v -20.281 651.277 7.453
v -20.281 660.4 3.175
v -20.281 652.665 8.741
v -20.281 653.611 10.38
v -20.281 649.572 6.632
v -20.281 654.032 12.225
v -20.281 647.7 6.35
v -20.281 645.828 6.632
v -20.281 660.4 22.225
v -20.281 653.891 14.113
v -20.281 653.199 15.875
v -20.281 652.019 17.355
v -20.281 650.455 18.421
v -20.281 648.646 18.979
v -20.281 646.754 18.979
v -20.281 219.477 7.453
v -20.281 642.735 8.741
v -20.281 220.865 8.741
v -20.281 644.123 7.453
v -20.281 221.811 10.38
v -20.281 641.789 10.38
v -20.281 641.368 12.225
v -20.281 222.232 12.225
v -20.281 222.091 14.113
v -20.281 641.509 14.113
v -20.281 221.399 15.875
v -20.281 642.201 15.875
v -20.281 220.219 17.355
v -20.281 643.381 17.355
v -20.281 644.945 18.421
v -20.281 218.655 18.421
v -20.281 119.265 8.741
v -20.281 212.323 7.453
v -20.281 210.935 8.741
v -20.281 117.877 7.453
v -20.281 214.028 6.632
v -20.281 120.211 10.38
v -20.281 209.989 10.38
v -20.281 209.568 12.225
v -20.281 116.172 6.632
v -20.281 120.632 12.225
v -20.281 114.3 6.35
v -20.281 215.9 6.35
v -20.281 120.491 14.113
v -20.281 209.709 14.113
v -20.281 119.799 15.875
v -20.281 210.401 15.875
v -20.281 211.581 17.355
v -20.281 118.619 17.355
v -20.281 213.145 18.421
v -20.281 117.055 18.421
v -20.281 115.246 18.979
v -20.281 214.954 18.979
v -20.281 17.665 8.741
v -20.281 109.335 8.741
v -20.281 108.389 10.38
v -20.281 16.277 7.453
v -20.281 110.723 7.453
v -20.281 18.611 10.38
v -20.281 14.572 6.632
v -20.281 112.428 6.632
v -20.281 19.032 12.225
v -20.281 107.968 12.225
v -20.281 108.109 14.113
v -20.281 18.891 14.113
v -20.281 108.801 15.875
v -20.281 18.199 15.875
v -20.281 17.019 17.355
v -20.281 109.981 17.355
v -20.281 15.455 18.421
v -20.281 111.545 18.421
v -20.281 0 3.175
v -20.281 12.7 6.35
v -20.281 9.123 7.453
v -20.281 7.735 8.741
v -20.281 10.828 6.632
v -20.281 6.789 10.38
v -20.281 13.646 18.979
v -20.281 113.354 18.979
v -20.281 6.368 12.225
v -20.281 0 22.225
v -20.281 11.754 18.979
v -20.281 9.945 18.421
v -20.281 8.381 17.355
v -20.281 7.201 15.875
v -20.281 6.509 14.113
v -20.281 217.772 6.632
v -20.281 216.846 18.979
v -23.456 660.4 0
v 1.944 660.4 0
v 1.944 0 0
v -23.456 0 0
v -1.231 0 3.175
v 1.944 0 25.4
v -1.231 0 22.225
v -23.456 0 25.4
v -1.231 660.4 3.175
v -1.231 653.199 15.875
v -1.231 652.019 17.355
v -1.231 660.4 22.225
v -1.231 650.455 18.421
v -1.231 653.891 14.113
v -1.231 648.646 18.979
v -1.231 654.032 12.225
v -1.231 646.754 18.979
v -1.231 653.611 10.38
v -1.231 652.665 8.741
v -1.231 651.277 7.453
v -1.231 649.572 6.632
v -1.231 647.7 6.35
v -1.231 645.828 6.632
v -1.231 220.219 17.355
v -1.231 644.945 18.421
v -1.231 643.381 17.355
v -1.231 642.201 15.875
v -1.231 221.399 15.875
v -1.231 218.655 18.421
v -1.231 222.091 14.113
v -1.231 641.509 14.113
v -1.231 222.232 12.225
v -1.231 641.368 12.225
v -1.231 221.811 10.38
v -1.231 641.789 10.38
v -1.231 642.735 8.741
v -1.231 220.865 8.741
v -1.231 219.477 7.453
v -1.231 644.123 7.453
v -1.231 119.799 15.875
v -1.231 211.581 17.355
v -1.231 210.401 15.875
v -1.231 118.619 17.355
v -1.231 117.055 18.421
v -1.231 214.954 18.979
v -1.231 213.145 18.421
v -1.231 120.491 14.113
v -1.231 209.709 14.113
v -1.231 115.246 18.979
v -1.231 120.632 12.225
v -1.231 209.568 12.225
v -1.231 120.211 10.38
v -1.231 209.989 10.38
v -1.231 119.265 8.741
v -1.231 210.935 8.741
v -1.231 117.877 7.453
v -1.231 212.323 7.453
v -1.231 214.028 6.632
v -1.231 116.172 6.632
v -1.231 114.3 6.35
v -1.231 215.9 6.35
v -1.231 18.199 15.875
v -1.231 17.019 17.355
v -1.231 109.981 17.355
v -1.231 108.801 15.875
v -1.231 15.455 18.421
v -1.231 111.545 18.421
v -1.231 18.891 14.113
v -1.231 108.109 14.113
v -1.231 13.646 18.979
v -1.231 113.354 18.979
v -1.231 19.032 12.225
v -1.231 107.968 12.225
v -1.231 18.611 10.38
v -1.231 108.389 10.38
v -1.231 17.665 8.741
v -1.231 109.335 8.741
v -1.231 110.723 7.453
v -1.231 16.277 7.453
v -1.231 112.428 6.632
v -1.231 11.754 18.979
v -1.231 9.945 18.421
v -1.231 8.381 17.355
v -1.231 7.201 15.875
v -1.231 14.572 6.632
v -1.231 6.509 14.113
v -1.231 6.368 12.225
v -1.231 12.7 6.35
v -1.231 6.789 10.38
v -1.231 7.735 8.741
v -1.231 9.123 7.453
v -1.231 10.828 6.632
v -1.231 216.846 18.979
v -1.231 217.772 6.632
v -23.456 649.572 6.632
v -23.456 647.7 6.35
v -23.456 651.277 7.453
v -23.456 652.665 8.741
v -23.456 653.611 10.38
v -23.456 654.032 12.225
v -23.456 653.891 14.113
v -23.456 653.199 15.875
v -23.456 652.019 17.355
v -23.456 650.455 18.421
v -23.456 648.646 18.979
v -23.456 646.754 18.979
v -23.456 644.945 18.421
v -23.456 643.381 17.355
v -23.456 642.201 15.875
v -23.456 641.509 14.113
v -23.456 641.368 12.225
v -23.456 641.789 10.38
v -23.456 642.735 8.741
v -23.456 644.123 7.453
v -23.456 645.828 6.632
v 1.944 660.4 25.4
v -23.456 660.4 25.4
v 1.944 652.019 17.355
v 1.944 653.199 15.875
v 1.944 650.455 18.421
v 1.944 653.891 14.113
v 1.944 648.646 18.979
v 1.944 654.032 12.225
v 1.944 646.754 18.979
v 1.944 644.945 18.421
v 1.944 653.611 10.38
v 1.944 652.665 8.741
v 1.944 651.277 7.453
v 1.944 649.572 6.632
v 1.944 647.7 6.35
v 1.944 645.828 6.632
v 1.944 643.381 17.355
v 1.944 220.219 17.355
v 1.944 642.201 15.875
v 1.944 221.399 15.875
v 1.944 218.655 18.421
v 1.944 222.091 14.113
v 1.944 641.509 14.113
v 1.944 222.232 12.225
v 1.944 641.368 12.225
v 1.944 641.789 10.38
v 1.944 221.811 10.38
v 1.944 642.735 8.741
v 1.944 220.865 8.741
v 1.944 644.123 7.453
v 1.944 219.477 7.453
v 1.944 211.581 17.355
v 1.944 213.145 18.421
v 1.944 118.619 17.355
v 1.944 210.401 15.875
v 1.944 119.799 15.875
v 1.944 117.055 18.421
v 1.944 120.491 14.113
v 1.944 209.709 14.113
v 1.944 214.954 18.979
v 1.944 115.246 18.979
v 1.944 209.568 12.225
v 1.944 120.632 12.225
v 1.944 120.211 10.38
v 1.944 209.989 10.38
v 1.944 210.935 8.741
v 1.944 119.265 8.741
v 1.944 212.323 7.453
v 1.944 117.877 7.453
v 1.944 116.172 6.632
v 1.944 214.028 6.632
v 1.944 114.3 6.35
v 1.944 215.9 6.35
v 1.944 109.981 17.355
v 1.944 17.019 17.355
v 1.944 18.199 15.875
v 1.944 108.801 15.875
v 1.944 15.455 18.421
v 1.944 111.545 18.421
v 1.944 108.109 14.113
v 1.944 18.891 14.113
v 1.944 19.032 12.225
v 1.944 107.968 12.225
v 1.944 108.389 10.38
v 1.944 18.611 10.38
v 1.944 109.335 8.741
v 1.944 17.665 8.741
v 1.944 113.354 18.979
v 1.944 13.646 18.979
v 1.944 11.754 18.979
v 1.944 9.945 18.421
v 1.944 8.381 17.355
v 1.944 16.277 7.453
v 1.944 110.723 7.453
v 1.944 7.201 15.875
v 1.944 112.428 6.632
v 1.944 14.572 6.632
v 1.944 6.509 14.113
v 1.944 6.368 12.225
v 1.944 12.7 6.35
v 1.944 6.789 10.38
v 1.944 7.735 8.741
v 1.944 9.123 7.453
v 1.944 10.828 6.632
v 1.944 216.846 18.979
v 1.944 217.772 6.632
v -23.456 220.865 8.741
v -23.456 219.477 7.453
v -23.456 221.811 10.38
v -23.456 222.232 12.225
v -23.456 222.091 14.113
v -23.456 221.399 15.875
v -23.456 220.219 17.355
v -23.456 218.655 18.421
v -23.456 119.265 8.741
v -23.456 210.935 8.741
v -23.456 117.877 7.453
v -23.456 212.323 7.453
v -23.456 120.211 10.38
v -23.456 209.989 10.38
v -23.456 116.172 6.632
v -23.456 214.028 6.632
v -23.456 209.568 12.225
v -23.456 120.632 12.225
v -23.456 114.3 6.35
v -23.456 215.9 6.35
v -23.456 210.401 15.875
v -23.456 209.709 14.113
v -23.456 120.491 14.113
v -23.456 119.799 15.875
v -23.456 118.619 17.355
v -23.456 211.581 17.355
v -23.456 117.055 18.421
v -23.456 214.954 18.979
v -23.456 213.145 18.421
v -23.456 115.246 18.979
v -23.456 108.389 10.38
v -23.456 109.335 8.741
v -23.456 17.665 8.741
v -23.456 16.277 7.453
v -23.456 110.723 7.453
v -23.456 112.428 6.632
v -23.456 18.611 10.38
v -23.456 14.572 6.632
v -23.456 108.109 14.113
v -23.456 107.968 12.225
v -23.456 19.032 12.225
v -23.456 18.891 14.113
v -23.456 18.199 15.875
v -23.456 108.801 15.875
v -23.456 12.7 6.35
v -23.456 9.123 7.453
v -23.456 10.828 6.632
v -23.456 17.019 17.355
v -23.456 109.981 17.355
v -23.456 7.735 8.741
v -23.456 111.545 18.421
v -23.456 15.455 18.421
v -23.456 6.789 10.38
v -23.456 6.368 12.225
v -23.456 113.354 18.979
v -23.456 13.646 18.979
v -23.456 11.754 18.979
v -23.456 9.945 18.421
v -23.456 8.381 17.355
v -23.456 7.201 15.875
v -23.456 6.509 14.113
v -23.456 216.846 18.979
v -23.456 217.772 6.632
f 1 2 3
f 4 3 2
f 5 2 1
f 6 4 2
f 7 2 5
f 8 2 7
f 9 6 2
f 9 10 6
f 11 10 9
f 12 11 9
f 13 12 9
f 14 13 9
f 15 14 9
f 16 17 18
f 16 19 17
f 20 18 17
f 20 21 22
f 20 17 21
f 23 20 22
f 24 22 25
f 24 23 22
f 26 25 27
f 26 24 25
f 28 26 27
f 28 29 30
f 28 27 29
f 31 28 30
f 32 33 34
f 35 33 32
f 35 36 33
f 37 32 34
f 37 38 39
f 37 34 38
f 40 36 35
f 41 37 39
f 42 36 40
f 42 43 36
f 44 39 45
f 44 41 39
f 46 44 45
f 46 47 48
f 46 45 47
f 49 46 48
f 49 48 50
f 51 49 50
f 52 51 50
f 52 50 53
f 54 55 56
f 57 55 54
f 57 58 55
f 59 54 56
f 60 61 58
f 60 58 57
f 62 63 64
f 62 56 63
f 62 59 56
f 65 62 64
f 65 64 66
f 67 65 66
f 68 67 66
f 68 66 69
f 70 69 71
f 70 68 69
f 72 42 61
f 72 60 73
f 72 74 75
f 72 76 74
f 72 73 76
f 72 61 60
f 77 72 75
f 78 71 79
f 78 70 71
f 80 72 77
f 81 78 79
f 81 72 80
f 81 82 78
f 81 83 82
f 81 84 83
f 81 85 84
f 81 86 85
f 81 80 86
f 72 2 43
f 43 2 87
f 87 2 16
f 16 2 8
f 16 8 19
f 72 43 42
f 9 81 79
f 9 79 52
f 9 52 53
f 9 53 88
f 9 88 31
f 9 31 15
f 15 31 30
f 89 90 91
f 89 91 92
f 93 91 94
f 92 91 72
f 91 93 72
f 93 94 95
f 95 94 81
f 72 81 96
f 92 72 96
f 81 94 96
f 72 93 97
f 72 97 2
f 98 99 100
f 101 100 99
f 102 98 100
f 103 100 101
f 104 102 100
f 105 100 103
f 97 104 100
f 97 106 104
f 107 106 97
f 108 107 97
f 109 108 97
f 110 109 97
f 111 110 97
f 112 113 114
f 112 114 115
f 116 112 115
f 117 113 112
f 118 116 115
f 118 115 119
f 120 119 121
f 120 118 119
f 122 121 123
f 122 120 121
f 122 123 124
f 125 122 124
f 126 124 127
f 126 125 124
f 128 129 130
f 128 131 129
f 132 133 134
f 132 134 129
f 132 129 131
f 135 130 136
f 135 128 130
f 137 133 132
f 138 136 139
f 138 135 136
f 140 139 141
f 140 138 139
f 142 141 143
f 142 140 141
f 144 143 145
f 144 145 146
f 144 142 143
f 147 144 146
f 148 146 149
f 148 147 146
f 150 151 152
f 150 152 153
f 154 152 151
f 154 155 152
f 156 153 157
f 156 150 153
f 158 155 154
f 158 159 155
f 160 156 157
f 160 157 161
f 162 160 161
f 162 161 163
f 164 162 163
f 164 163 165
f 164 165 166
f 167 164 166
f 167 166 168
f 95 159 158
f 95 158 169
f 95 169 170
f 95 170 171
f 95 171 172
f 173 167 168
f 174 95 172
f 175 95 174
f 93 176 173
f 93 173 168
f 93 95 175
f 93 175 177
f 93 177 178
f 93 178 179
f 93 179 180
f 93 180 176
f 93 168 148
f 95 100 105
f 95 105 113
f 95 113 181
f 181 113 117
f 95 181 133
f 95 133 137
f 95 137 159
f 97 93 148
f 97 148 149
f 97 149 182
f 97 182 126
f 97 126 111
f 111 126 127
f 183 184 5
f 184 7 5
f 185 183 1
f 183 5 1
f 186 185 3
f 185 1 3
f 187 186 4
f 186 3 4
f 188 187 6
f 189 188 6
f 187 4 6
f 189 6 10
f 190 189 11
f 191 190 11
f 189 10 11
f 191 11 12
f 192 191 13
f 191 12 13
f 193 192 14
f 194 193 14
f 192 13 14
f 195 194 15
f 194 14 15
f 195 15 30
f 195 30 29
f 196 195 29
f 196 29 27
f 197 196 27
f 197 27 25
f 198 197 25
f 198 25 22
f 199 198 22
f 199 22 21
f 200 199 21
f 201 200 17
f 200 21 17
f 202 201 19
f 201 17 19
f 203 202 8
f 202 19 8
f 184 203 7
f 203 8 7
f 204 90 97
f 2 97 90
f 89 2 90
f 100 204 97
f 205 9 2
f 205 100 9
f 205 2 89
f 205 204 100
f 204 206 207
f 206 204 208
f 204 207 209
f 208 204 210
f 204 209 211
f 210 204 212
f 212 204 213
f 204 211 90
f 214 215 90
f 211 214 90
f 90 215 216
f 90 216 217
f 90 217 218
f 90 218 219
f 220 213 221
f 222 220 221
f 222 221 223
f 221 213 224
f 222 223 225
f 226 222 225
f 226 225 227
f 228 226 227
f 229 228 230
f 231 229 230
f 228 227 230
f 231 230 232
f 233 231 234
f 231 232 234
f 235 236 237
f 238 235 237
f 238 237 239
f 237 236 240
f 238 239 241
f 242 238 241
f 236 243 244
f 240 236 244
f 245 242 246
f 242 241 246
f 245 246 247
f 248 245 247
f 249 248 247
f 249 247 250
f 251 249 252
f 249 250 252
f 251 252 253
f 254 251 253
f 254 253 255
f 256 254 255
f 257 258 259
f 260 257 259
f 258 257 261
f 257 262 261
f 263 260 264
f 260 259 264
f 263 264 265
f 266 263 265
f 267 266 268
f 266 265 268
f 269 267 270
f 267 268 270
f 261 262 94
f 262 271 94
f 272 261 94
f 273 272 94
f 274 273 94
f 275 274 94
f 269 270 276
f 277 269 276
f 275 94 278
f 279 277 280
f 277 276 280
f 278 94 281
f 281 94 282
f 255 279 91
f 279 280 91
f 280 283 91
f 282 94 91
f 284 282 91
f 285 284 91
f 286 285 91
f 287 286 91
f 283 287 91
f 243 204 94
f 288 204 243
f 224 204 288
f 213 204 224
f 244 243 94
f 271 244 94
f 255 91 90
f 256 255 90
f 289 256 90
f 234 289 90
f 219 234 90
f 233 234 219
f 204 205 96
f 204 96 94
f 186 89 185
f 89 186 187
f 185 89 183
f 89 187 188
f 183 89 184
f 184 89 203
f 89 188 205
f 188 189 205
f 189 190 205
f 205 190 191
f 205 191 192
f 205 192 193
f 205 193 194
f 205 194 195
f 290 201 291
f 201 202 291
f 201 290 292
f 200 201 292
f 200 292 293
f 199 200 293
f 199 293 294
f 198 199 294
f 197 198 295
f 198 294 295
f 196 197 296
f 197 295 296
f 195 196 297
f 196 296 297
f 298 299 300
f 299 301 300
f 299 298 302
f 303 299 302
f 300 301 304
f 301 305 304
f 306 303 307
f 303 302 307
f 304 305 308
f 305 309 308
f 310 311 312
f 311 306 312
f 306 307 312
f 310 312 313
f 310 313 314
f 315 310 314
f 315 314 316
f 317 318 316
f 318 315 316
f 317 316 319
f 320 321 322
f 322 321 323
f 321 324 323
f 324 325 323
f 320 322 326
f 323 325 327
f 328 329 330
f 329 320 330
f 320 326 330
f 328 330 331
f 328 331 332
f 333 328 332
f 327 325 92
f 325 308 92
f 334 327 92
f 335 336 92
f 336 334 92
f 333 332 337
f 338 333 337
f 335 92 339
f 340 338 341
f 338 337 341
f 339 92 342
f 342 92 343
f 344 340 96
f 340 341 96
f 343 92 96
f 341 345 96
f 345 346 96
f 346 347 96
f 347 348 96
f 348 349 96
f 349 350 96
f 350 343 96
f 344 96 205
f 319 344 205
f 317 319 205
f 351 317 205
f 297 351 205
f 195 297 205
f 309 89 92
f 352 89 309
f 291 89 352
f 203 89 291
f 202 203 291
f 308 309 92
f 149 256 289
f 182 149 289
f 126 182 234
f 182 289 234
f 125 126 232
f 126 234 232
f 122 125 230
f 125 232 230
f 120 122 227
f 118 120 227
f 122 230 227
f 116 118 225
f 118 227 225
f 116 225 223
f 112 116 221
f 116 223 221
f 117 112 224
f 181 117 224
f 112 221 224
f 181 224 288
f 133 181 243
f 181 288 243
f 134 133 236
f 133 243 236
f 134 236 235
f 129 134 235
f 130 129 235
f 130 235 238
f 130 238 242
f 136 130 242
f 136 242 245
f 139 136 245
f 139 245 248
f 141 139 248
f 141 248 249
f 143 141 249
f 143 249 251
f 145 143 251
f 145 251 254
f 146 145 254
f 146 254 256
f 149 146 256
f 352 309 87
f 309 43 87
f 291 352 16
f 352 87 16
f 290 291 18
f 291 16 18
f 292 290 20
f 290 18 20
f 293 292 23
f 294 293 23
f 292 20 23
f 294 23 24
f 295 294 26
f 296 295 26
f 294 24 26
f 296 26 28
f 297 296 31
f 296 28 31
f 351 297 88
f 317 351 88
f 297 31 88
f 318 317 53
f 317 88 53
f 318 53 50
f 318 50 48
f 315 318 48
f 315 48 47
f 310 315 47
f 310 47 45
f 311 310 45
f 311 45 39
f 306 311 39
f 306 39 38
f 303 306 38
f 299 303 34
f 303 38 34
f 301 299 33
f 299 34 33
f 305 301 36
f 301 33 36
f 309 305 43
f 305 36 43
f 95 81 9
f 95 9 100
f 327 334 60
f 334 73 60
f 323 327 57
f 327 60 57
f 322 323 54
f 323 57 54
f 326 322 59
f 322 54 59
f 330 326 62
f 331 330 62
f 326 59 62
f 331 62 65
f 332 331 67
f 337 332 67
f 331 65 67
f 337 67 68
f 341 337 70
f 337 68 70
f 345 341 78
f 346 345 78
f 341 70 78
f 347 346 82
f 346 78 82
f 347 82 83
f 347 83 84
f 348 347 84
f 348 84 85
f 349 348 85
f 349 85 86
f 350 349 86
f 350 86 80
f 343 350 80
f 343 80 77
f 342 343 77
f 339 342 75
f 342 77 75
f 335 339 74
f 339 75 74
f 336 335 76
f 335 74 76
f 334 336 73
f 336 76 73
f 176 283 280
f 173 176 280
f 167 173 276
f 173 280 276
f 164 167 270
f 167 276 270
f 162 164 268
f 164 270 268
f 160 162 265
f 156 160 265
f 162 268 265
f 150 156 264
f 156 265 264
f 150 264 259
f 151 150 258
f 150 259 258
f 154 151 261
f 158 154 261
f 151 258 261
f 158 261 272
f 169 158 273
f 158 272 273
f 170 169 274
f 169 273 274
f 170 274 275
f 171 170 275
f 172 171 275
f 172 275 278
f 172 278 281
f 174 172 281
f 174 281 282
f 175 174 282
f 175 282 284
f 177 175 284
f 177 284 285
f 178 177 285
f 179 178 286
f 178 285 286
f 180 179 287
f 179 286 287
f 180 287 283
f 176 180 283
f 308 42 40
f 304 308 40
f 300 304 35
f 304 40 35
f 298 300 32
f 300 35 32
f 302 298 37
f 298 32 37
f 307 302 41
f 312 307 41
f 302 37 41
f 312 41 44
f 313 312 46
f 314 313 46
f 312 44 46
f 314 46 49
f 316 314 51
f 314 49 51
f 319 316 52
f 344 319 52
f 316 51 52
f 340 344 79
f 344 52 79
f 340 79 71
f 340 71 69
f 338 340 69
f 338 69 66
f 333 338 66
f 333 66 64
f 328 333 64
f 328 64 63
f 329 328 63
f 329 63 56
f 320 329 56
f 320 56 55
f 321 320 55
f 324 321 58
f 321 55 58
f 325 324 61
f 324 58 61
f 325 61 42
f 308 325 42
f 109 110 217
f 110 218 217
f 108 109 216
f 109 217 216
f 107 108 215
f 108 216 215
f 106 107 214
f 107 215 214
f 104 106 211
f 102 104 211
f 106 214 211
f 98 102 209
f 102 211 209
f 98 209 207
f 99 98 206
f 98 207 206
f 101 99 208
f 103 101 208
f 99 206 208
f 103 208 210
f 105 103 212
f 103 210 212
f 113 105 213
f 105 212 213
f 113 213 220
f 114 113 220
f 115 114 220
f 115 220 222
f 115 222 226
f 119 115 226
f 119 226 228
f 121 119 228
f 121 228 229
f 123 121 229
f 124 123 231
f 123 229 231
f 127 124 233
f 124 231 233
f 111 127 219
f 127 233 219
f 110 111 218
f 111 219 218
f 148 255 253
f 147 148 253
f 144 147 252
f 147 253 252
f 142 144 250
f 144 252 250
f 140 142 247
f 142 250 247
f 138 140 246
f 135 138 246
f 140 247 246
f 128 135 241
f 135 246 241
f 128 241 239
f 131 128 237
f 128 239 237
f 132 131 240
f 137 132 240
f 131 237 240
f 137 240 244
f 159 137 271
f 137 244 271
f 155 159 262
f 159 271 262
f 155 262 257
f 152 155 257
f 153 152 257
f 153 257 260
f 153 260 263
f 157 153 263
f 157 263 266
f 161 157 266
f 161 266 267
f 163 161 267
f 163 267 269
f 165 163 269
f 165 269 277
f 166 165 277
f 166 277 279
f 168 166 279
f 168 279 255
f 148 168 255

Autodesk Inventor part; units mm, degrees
ref_plane "YZ Plane" through (0, 0, 0) normal (1, 0, 0) x (0, 1, 0)
ref_plane "XZ Plane" through (0, 0, 0) normal (0, 1, 0) x (-1, 0, 0)
ref_plane "XY Plane" through (0, 0, 0) normal (0, 0, 1) x (1, 0, 0)
sketch "Sketch1" plane through (0, 0, 0) normal (0, 1, 0) x (-1, 0, 0)
  line L0 (-1.9439, 0) -> (23.4561, 0)
  line L1 (23.4561, 0) -> (23.4561, 25.4)
  line L2 (23.4561, 25.4) -> (-1.9439, 25.4)
  line L3 (-1.9439, 25.4) -> (-1.9439, 0)
  line L4 (20.2811, 22.225) -> (1.2311, 22.225)
  line L5 (1.2311, 22.225) -> (1.2311, 3.175)
  line L6 (1.2311, 3.175) -> (20.2811, 3.175)
  line L7 (20.2811, 3.175) -> (20.2811, 22.225)
  point P0 (0, 0)
  dimension "d0" = 25.4
  dimension "d1" = 25.4
  dimension "d2" = 3.175
  dimension "d4" = 3.175
  dimension "d5" = 3.175
  dimension "d6" = 3.175
extrude "Extrusion1" add sketch "Sketch1" along normal blind 660.4
sketch "Sketch2" plane through (1.9439, 0, 25.4) normal (1, 0, 0) x (0, 0, -1)
  circle A0 centre (12.7, 12.7) radius 6.35
  line L0 (25.4, 0) -> (25.4, 660.4) projected
  line L1 (0, 0) -> (25.4, 0) projected
  circle A1 centre (12.7, 647.7) radius 6.35
  line L2 (0, 660.4) -> (25.4, 660.4) projected
  dimension "d9" = 12.7
  dimension "d10" = 12.7
  dimension "d11" = 12.7
  dimension "d12" = 12.7
  dimension "d13" = 12.7
  dimension "d14" = 12.7
extrude "Extrusion2" cut sketch "Sketch2" against normal blind 660.4
sketch "Sketch3" plane through (1.9439, 0, 25.4) normal (1, 0, 0) x (0, 0, -1)
  circle A0 centre (12.7, 647.7) radius 6.35 projected
  circle A1 centre (12.7, 647.7) radius 6.35
  circle A2 centre (12.7, 12.7) radius 6.35
  circle A3 centre (12.7, 114.3) radius 6.35
  line L0 (0, 0) -> (25.4, 0) projected
  line L1 (25.4, 0) -> (25.4, 660.4) projected
  dimension "d17" = 12.7
  dimension "d18" = 12.7
  dimension "d19" = 12.7
  dimension "d20" = 12.7
  dimension "d21" = 101.6
  dimension "d22" = 12.7
extrude "Extrusion3" cut sketch "Sketch3" against normal blind 660.4 contours A3
sketch "Sketch4" plane through (-23.4561, 0, 25.4) normal (0, 0, 1) x (1, 0, 0)
  point P0 (23.4561, 0)
sketch "Sketch5" plane through (1.9439, 0, 25.4) normal (1, 0, 0) x (0, 0, -1)
  circle A0 centre (12.7, 215.9) radius 6.35
  circle A1 centre (12.7, 114.3) radius 6.35 projected
  circle A2 centre (12.7, 114.3) radius 6.35
  line L0 (25.4, 0) -> (25.4, 660.4) projected
  dimension "d25" = 12.7
  dimension "d26" = 101.6
  dimension "d27" = 12.7
extrude "Extrusion4" cut sketch "Sketch5" against normal blind 660.4 contours A0
properties part number "26 inch 8th inch thick tube"
